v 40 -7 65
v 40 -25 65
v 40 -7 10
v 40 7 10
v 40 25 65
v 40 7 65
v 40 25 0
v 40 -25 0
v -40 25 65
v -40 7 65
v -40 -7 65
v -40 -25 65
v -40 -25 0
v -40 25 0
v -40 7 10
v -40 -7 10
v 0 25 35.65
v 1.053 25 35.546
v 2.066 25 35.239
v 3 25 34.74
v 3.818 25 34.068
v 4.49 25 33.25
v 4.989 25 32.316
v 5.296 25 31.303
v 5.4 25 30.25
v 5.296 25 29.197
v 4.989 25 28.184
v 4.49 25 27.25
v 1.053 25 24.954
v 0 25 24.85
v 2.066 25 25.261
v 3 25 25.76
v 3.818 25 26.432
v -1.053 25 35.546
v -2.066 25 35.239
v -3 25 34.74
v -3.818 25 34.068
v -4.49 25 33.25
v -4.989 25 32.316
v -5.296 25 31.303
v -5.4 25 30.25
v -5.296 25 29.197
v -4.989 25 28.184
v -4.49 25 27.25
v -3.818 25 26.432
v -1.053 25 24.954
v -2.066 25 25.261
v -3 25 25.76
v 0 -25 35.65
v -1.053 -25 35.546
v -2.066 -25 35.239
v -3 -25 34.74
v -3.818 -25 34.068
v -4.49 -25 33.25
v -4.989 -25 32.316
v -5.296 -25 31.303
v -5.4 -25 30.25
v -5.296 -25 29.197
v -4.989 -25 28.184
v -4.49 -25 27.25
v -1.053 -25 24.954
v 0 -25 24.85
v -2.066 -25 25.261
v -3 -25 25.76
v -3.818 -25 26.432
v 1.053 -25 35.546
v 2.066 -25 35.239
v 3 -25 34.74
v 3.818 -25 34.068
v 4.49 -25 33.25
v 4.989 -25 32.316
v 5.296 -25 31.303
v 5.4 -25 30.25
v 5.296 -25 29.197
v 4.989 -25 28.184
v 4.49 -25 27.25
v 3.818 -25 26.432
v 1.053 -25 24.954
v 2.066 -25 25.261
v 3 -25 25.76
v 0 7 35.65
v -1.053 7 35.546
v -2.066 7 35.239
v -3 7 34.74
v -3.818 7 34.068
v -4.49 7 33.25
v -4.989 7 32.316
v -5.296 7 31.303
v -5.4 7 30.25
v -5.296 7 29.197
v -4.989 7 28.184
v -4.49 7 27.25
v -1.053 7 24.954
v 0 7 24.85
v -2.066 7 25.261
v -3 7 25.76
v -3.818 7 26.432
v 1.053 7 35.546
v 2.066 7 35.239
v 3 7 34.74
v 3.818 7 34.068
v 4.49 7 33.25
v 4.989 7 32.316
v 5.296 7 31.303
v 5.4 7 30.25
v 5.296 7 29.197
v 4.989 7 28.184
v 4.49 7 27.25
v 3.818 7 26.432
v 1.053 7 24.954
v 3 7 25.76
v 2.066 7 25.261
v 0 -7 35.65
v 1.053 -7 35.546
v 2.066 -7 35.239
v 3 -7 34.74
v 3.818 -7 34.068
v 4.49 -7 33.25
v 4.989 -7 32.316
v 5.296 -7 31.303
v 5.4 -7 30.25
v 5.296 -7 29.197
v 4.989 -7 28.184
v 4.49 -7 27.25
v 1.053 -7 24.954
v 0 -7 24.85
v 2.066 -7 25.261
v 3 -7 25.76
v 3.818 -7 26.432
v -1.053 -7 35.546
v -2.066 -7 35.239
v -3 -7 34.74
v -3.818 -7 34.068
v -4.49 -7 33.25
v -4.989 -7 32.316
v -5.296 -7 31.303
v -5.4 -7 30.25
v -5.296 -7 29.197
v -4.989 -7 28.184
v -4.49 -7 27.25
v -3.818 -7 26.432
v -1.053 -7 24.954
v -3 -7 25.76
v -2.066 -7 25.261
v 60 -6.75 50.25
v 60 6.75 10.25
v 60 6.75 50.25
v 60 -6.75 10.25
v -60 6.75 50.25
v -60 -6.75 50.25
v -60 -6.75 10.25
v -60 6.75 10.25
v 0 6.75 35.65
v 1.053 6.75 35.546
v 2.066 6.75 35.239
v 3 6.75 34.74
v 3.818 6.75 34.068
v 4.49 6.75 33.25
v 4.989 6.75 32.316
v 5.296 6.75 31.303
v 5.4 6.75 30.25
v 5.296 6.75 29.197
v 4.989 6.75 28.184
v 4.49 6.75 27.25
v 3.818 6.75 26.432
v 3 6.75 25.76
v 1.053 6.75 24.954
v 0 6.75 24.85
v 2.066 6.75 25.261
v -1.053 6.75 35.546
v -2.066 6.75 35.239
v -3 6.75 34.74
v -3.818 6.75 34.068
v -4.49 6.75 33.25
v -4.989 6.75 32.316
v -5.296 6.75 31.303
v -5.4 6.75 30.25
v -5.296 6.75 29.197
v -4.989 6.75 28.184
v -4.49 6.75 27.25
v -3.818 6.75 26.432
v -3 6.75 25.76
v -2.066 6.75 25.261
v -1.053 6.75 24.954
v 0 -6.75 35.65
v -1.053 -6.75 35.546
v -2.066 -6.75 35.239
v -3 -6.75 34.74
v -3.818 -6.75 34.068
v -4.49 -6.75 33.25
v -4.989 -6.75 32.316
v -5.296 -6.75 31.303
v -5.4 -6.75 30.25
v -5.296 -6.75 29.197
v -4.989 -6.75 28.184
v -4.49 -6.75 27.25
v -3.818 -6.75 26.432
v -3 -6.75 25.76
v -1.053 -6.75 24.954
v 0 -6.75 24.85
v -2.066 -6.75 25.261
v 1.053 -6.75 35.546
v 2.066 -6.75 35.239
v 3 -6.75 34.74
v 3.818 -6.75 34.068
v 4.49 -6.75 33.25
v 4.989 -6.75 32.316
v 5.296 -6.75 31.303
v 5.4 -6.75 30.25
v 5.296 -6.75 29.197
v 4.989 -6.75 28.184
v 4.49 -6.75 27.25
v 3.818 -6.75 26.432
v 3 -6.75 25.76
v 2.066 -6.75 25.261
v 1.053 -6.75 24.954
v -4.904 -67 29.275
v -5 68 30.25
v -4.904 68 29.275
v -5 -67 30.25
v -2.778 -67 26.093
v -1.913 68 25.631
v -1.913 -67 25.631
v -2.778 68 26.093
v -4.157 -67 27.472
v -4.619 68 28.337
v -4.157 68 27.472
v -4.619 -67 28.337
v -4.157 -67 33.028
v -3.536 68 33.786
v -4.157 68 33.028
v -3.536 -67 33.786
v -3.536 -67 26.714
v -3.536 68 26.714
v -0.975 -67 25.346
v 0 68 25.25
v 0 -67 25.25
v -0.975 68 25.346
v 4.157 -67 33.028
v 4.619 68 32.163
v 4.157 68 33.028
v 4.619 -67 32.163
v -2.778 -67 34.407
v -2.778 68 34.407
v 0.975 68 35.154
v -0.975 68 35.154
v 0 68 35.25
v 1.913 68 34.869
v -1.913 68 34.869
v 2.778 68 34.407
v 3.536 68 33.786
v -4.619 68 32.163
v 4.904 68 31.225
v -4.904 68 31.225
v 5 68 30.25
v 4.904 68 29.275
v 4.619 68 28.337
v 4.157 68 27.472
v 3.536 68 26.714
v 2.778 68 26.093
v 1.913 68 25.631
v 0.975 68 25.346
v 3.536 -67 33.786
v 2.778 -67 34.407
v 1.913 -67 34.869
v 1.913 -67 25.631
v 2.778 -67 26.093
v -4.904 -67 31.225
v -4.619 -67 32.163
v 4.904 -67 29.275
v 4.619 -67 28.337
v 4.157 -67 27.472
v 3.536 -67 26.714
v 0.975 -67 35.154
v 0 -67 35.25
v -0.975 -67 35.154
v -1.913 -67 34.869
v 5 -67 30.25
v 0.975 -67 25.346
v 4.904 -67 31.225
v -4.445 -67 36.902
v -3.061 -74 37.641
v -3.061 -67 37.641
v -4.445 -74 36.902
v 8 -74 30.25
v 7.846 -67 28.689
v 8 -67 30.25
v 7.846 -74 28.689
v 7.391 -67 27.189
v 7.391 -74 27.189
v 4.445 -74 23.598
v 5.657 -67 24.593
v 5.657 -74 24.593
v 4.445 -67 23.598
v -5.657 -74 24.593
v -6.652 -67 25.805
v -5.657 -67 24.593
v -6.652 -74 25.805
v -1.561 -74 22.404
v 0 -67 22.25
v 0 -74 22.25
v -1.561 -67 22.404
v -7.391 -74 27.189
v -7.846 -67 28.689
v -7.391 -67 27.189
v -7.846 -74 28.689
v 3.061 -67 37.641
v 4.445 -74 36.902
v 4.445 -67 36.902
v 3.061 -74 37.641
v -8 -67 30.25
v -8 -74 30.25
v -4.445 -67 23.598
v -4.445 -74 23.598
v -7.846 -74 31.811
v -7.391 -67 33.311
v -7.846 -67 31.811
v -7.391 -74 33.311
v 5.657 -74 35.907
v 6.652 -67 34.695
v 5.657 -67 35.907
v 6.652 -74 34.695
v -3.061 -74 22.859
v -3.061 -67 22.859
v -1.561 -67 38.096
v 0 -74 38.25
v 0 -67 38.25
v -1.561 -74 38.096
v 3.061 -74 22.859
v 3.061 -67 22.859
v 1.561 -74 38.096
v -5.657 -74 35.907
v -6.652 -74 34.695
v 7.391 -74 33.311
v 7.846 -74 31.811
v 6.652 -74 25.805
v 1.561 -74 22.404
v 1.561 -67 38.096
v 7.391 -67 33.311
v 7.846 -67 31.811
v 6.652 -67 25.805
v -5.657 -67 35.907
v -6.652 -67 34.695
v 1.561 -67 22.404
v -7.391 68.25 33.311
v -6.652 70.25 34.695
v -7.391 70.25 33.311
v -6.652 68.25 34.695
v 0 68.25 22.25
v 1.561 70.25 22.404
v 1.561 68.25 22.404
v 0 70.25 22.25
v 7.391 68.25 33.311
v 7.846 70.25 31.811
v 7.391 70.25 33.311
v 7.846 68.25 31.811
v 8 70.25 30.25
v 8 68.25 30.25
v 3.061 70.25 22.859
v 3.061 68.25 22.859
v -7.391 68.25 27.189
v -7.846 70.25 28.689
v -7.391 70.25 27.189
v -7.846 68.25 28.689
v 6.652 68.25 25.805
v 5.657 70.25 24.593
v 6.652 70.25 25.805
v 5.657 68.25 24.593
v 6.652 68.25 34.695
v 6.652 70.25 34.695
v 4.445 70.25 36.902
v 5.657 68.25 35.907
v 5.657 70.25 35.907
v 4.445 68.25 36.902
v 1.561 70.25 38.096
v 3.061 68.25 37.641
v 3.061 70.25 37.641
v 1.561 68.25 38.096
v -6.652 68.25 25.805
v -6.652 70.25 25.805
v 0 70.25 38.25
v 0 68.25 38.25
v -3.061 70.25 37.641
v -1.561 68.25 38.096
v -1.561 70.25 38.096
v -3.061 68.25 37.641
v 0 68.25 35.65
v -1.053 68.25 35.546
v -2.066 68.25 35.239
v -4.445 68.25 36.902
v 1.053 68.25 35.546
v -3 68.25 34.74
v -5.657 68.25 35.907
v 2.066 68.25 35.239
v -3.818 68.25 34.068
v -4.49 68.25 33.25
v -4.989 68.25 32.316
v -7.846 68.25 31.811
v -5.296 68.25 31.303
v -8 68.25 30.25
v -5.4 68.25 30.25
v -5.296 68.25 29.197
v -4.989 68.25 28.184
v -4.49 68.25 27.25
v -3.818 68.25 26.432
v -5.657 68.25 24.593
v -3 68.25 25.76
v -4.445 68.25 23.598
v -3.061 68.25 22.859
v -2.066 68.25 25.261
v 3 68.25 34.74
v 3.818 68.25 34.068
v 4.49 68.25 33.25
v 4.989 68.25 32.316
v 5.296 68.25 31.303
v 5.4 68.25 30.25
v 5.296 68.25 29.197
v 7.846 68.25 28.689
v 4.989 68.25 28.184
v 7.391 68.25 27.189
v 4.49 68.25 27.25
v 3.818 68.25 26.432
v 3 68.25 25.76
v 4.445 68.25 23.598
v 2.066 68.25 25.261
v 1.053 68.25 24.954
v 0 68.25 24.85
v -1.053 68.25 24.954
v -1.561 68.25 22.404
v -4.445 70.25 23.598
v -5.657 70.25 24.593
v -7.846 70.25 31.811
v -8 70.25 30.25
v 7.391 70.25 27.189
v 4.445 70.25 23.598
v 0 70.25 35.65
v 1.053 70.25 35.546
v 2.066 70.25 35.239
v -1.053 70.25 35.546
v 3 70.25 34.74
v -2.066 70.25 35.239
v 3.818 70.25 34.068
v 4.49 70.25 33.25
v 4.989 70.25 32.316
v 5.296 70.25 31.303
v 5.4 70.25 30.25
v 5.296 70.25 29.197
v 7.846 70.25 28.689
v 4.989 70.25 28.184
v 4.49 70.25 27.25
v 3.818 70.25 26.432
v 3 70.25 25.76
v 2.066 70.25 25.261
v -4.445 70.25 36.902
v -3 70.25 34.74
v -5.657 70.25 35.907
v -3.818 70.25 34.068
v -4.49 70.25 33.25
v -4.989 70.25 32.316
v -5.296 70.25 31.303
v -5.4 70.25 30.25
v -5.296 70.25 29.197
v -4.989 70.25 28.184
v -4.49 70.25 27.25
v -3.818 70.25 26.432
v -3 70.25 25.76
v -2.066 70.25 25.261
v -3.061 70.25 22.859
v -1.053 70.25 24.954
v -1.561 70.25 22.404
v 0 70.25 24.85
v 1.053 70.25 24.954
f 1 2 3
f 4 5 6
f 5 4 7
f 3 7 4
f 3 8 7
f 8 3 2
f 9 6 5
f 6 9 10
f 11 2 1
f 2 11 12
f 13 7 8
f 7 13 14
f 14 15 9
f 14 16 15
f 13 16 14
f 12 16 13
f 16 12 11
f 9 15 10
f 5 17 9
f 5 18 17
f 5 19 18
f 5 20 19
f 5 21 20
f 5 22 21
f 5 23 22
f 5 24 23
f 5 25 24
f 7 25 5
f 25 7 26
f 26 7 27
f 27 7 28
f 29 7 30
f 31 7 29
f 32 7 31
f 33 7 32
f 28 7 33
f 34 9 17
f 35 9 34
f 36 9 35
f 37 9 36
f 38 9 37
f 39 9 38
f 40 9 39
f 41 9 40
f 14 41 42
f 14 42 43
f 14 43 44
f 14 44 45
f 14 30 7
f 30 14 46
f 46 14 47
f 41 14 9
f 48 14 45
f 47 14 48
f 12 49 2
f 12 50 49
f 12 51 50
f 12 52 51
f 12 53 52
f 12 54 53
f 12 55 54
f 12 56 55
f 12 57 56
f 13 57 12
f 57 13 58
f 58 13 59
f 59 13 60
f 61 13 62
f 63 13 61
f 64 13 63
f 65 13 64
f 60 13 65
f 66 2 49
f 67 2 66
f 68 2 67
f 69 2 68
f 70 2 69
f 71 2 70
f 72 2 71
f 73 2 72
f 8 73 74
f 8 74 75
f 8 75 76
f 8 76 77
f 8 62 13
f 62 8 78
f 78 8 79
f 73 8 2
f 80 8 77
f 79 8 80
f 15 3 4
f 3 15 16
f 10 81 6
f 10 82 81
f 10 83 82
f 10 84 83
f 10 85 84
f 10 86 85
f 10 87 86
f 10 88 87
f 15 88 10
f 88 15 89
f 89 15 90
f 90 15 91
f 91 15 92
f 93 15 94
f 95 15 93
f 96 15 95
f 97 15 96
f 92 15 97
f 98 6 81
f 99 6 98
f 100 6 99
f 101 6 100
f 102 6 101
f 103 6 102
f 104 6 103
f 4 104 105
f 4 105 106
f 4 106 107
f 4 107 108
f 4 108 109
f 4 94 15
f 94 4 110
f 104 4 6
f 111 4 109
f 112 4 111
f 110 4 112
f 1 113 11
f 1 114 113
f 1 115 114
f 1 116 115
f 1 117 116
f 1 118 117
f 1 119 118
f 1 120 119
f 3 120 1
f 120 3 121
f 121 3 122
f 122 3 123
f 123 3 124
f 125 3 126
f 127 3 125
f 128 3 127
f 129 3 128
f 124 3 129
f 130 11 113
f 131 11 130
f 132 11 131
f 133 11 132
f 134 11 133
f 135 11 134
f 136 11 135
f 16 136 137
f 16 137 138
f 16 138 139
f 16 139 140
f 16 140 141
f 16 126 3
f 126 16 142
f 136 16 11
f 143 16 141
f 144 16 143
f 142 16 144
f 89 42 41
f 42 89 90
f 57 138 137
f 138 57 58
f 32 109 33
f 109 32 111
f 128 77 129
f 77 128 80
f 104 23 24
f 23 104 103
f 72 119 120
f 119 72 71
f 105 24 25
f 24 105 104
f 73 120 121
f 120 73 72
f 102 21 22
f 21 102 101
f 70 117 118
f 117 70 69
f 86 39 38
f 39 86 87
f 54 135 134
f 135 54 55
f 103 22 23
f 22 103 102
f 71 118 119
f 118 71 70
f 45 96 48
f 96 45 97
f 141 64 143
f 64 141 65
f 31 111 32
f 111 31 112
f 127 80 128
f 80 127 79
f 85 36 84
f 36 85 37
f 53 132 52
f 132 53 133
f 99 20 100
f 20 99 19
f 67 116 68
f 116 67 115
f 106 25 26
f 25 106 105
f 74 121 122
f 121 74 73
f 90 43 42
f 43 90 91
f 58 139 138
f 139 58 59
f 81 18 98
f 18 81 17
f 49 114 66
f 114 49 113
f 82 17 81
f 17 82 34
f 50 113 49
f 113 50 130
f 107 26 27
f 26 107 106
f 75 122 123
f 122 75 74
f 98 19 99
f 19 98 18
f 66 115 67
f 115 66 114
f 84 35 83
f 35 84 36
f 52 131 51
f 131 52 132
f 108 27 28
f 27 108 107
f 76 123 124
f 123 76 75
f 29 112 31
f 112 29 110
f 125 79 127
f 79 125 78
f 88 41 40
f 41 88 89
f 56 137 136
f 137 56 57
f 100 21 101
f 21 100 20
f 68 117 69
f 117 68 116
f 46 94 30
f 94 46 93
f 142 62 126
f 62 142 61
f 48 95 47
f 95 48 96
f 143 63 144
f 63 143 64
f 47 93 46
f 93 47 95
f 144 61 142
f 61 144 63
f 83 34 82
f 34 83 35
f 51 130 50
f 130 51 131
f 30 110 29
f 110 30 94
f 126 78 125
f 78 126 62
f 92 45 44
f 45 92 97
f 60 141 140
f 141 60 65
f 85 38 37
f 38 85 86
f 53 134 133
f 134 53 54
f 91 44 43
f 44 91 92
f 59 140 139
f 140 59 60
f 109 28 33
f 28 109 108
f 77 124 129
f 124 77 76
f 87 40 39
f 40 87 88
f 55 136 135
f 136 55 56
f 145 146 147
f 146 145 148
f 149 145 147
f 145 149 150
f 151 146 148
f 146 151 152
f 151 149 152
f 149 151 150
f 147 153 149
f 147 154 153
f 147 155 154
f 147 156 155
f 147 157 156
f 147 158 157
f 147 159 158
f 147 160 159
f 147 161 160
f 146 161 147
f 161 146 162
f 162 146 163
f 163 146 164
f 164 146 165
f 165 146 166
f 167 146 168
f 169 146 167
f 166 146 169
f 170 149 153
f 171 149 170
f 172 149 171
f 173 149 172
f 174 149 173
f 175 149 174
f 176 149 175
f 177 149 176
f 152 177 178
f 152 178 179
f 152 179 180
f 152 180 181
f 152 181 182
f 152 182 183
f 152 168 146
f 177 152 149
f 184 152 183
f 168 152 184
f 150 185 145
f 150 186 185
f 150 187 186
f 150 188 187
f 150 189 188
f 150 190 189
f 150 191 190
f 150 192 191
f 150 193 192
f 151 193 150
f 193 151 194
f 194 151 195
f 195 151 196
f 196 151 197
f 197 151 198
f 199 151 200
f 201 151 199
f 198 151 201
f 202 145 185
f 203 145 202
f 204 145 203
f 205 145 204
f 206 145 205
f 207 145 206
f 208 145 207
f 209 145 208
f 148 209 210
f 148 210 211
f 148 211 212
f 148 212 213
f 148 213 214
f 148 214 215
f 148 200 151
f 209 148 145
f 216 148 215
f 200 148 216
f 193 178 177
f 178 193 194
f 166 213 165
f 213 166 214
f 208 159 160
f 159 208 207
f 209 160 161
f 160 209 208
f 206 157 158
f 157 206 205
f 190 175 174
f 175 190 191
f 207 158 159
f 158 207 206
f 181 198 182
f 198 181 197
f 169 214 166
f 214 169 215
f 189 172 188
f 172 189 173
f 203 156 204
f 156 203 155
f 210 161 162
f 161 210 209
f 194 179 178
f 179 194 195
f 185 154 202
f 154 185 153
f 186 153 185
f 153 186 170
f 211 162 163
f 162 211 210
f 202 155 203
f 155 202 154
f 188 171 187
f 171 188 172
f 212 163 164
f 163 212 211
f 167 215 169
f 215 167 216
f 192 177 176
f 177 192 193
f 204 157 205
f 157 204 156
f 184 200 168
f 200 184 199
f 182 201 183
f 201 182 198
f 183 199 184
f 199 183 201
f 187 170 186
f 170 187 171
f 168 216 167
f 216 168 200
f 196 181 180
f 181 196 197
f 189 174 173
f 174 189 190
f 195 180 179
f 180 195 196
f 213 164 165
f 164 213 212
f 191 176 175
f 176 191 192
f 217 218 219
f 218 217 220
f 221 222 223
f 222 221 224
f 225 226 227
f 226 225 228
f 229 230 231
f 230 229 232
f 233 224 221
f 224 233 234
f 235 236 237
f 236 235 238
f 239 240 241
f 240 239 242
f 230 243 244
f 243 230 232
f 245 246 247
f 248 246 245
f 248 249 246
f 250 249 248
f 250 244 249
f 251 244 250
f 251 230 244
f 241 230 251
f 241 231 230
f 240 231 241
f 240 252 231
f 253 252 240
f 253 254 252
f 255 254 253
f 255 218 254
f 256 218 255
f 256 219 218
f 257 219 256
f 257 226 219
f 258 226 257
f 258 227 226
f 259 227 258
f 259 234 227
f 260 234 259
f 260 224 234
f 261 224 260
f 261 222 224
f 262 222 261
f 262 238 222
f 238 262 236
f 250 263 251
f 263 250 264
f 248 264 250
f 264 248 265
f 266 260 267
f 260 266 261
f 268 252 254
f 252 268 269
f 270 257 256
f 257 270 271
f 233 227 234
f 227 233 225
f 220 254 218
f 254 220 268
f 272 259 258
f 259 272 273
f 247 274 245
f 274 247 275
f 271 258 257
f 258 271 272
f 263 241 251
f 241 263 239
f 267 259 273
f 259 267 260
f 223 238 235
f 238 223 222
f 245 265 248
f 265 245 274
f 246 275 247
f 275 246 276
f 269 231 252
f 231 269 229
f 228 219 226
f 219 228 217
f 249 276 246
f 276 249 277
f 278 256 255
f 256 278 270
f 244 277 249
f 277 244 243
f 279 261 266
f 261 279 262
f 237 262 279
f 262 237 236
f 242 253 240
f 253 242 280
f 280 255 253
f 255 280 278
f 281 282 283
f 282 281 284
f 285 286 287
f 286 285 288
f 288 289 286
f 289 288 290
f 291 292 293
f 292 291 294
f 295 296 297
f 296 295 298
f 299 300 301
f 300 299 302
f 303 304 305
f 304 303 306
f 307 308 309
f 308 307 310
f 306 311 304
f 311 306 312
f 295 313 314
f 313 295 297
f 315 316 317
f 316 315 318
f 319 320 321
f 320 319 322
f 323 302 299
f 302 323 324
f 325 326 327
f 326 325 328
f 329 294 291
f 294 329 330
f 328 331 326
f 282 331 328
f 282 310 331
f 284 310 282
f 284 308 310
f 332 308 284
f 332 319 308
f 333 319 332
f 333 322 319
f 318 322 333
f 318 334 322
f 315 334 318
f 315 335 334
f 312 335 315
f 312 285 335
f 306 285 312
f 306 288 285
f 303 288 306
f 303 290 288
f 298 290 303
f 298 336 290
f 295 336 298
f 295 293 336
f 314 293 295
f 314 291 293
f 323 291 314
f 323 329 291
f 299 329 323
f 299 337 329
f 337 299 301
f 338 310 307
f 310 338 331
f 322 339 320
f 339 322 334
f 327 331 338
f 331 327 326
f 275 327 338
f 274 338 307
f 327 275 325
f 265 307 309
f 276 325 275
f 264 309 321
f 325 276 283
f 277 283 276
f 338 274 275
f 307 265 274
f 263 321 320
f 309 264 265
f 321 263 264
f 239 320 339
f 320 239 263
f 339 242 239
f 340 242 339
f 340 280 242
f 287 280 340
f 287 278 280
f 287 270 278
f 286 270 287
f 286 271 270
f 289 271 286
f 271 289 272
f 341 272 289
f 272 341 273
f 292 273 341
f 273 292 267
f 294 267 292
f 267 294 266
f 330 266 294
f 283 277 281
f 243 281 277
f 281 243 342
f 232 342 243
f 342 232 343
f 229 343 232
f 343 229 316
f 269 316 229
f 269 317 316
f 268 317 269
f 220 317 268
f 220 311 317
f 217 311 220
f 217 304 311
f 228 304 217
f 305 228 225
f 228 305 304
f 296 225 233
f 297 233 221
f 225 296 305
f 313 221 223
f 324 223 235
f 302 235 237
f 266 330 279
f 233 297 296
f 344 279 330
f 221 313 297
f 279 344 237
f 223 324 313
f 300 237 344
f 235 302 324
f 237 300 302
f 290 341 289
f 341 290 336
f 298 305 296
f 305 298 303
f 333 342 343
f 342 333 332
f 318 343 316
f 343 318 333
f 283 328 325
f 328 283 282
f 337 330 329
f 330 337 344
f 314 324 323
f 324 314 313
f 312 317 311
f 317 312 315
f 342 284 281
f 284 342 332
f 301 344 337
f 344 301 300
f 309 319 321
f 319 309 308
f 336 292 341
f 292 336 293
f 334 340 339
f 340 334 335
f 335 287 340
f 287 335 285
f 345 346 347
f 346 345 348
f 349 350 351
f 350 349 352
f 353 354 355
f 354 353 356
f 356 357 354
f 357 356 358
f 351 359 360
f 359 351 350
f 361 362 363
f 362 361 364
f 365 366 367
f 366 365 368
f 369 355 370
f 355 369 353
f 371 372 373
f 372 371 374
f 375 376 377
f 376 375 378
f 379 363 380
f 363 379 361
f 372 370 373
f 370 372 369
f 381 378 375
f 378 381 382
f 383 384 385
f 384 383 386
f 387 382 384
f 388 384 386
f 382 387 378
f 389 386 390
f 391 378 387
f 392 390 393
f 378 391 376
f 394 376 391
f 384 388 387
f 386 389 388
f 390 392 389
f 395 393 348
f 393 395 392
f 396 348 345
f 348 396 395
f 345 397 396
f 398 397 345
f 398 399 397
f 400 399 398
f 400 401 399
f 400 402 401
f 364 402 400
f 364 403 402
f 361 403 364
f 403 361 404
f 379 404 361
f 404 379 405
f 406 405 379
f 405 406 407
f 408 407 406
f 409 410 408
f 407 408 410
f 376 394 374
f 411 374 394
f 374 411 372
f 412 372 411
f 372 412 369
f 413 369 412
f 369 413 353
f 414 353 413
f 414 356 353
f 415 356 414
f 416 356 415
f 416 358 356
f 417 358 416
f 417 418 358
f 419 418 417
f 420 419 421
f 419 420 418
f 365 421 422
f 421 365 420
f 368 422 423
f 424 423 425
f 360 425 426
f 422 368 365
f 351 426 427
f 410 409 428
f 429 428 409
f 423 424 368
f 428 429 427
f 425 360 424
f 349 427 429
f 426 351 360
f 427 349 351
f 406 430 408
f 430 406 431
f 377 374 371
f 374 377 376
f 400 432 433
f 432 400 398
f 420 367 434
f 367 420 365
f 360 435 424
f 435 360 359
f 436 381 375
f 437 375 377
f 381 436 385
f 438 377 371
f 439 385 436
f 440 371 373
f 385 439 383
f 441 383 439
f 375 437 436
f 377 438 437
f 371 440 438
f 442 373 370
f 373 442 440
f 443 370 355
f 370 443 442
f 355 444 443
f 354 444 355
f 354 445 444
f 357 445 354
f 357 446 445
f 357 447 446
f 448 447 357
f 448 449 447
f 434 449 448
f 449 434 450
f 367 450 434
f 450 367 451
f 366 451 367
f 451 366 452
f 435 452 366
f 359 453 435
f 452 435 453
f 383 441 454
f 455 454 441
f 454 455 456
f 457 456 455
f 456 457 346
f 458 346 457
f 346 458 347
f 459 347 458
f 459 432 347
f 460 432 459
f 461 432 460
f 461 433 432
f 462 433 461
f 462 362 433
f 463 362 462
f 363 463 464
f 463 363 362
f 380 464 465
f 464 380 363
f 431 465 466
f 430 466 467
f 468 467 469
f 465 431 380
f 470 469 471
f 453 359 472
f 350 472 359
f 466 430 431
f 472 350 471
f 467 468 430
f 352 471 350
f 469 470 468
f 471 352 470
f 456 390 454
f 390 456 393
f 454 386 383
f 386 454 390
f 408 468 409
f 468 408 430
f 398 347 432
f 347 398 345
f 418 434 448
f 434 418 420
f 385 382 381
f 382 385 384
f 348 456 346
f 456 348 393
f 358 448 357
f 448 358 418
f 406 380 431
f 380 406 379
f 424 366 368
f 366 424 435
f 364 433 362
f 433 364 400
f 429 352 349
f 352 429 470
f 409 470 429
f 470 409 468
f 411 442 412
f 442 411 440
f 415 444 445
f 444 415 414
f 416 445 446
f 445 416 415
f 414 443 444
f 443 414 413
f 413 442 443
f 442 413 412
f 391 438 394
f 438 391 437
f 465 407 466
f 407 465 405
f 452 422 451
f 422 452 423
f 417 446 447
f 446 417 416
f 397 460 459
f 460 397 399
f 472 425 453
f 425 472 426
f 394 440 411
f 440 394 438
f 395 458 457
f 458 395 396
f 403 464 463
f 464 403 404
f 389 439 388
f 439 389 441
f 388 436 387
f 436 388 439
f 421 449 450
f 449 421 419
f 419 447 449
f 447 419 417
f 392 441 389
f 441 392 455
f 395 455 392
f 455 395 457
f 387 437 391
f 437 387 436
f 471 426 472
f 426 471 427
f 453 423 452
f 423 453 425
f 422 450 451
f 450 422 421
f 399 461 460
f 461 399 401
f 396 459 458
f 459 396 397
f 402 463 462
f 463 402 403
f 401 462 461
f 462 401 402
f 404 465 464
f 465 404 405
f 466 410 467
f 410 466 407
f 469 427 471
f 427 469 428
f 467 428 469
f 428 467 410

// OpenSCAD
$fn = 32;

// ------------------------------------------------------------------------
// Clevis joint: 80 mm clevis, pin d10
// Every part is its own module, assembly() places them once.
// ------------------------------------------------------------------------

// --- part 1 ---
module clevis() {
  difference() {
    translate([-40, -25, 0]) cube([80, 50, 65]);
    translate([-41, -7, 10]) cube([82, 14, 56]);
    translate([0, 0, 30.25]) rotate([90, 0, 0]) cylinder(h = 52, d = 10.8, center = true);
  }
}

// --- part 2 ---
module eye() {
  difference() {
    translate([-60, -6.75, 0]) cube([120, 13.5, 40]);
    translate([0, 0, 20]) rotate([90, 0, 0]) cylinder(h = 15.5, d = 10.8, center = true);
  }
}

// --- part 3 ---
module pin() {
  rotate([0, 90, 0]) cylinder(h = 136, d = 10, center = true);
  translate([-74, 0, 0]) rotate([0, 90, 0]) cylinder(h = 7, d = 16);
}

// --- part 4 ---
module retainer() {
  difference() {
      translate([0, 0, 0]) cylinder(h = 2, d = 16);
      translate([0, 0, -1]) cylinder(h = 4, d = 10.8);
    }
}

// --- assembly ---
module assembly() {
  translate([0, 0, 0]) rotate([0, 0, 0]) clevis();
  translate([0, 0, 10.25]) rotate([0, 0, 0]) eye();
  translate([0, 0, 30.25]) rotate([0, 0, 90]) pin();
  translate([0, 70.25, 30.25]) rotate([90, 0, 0]) retainer();
}

assembly();
